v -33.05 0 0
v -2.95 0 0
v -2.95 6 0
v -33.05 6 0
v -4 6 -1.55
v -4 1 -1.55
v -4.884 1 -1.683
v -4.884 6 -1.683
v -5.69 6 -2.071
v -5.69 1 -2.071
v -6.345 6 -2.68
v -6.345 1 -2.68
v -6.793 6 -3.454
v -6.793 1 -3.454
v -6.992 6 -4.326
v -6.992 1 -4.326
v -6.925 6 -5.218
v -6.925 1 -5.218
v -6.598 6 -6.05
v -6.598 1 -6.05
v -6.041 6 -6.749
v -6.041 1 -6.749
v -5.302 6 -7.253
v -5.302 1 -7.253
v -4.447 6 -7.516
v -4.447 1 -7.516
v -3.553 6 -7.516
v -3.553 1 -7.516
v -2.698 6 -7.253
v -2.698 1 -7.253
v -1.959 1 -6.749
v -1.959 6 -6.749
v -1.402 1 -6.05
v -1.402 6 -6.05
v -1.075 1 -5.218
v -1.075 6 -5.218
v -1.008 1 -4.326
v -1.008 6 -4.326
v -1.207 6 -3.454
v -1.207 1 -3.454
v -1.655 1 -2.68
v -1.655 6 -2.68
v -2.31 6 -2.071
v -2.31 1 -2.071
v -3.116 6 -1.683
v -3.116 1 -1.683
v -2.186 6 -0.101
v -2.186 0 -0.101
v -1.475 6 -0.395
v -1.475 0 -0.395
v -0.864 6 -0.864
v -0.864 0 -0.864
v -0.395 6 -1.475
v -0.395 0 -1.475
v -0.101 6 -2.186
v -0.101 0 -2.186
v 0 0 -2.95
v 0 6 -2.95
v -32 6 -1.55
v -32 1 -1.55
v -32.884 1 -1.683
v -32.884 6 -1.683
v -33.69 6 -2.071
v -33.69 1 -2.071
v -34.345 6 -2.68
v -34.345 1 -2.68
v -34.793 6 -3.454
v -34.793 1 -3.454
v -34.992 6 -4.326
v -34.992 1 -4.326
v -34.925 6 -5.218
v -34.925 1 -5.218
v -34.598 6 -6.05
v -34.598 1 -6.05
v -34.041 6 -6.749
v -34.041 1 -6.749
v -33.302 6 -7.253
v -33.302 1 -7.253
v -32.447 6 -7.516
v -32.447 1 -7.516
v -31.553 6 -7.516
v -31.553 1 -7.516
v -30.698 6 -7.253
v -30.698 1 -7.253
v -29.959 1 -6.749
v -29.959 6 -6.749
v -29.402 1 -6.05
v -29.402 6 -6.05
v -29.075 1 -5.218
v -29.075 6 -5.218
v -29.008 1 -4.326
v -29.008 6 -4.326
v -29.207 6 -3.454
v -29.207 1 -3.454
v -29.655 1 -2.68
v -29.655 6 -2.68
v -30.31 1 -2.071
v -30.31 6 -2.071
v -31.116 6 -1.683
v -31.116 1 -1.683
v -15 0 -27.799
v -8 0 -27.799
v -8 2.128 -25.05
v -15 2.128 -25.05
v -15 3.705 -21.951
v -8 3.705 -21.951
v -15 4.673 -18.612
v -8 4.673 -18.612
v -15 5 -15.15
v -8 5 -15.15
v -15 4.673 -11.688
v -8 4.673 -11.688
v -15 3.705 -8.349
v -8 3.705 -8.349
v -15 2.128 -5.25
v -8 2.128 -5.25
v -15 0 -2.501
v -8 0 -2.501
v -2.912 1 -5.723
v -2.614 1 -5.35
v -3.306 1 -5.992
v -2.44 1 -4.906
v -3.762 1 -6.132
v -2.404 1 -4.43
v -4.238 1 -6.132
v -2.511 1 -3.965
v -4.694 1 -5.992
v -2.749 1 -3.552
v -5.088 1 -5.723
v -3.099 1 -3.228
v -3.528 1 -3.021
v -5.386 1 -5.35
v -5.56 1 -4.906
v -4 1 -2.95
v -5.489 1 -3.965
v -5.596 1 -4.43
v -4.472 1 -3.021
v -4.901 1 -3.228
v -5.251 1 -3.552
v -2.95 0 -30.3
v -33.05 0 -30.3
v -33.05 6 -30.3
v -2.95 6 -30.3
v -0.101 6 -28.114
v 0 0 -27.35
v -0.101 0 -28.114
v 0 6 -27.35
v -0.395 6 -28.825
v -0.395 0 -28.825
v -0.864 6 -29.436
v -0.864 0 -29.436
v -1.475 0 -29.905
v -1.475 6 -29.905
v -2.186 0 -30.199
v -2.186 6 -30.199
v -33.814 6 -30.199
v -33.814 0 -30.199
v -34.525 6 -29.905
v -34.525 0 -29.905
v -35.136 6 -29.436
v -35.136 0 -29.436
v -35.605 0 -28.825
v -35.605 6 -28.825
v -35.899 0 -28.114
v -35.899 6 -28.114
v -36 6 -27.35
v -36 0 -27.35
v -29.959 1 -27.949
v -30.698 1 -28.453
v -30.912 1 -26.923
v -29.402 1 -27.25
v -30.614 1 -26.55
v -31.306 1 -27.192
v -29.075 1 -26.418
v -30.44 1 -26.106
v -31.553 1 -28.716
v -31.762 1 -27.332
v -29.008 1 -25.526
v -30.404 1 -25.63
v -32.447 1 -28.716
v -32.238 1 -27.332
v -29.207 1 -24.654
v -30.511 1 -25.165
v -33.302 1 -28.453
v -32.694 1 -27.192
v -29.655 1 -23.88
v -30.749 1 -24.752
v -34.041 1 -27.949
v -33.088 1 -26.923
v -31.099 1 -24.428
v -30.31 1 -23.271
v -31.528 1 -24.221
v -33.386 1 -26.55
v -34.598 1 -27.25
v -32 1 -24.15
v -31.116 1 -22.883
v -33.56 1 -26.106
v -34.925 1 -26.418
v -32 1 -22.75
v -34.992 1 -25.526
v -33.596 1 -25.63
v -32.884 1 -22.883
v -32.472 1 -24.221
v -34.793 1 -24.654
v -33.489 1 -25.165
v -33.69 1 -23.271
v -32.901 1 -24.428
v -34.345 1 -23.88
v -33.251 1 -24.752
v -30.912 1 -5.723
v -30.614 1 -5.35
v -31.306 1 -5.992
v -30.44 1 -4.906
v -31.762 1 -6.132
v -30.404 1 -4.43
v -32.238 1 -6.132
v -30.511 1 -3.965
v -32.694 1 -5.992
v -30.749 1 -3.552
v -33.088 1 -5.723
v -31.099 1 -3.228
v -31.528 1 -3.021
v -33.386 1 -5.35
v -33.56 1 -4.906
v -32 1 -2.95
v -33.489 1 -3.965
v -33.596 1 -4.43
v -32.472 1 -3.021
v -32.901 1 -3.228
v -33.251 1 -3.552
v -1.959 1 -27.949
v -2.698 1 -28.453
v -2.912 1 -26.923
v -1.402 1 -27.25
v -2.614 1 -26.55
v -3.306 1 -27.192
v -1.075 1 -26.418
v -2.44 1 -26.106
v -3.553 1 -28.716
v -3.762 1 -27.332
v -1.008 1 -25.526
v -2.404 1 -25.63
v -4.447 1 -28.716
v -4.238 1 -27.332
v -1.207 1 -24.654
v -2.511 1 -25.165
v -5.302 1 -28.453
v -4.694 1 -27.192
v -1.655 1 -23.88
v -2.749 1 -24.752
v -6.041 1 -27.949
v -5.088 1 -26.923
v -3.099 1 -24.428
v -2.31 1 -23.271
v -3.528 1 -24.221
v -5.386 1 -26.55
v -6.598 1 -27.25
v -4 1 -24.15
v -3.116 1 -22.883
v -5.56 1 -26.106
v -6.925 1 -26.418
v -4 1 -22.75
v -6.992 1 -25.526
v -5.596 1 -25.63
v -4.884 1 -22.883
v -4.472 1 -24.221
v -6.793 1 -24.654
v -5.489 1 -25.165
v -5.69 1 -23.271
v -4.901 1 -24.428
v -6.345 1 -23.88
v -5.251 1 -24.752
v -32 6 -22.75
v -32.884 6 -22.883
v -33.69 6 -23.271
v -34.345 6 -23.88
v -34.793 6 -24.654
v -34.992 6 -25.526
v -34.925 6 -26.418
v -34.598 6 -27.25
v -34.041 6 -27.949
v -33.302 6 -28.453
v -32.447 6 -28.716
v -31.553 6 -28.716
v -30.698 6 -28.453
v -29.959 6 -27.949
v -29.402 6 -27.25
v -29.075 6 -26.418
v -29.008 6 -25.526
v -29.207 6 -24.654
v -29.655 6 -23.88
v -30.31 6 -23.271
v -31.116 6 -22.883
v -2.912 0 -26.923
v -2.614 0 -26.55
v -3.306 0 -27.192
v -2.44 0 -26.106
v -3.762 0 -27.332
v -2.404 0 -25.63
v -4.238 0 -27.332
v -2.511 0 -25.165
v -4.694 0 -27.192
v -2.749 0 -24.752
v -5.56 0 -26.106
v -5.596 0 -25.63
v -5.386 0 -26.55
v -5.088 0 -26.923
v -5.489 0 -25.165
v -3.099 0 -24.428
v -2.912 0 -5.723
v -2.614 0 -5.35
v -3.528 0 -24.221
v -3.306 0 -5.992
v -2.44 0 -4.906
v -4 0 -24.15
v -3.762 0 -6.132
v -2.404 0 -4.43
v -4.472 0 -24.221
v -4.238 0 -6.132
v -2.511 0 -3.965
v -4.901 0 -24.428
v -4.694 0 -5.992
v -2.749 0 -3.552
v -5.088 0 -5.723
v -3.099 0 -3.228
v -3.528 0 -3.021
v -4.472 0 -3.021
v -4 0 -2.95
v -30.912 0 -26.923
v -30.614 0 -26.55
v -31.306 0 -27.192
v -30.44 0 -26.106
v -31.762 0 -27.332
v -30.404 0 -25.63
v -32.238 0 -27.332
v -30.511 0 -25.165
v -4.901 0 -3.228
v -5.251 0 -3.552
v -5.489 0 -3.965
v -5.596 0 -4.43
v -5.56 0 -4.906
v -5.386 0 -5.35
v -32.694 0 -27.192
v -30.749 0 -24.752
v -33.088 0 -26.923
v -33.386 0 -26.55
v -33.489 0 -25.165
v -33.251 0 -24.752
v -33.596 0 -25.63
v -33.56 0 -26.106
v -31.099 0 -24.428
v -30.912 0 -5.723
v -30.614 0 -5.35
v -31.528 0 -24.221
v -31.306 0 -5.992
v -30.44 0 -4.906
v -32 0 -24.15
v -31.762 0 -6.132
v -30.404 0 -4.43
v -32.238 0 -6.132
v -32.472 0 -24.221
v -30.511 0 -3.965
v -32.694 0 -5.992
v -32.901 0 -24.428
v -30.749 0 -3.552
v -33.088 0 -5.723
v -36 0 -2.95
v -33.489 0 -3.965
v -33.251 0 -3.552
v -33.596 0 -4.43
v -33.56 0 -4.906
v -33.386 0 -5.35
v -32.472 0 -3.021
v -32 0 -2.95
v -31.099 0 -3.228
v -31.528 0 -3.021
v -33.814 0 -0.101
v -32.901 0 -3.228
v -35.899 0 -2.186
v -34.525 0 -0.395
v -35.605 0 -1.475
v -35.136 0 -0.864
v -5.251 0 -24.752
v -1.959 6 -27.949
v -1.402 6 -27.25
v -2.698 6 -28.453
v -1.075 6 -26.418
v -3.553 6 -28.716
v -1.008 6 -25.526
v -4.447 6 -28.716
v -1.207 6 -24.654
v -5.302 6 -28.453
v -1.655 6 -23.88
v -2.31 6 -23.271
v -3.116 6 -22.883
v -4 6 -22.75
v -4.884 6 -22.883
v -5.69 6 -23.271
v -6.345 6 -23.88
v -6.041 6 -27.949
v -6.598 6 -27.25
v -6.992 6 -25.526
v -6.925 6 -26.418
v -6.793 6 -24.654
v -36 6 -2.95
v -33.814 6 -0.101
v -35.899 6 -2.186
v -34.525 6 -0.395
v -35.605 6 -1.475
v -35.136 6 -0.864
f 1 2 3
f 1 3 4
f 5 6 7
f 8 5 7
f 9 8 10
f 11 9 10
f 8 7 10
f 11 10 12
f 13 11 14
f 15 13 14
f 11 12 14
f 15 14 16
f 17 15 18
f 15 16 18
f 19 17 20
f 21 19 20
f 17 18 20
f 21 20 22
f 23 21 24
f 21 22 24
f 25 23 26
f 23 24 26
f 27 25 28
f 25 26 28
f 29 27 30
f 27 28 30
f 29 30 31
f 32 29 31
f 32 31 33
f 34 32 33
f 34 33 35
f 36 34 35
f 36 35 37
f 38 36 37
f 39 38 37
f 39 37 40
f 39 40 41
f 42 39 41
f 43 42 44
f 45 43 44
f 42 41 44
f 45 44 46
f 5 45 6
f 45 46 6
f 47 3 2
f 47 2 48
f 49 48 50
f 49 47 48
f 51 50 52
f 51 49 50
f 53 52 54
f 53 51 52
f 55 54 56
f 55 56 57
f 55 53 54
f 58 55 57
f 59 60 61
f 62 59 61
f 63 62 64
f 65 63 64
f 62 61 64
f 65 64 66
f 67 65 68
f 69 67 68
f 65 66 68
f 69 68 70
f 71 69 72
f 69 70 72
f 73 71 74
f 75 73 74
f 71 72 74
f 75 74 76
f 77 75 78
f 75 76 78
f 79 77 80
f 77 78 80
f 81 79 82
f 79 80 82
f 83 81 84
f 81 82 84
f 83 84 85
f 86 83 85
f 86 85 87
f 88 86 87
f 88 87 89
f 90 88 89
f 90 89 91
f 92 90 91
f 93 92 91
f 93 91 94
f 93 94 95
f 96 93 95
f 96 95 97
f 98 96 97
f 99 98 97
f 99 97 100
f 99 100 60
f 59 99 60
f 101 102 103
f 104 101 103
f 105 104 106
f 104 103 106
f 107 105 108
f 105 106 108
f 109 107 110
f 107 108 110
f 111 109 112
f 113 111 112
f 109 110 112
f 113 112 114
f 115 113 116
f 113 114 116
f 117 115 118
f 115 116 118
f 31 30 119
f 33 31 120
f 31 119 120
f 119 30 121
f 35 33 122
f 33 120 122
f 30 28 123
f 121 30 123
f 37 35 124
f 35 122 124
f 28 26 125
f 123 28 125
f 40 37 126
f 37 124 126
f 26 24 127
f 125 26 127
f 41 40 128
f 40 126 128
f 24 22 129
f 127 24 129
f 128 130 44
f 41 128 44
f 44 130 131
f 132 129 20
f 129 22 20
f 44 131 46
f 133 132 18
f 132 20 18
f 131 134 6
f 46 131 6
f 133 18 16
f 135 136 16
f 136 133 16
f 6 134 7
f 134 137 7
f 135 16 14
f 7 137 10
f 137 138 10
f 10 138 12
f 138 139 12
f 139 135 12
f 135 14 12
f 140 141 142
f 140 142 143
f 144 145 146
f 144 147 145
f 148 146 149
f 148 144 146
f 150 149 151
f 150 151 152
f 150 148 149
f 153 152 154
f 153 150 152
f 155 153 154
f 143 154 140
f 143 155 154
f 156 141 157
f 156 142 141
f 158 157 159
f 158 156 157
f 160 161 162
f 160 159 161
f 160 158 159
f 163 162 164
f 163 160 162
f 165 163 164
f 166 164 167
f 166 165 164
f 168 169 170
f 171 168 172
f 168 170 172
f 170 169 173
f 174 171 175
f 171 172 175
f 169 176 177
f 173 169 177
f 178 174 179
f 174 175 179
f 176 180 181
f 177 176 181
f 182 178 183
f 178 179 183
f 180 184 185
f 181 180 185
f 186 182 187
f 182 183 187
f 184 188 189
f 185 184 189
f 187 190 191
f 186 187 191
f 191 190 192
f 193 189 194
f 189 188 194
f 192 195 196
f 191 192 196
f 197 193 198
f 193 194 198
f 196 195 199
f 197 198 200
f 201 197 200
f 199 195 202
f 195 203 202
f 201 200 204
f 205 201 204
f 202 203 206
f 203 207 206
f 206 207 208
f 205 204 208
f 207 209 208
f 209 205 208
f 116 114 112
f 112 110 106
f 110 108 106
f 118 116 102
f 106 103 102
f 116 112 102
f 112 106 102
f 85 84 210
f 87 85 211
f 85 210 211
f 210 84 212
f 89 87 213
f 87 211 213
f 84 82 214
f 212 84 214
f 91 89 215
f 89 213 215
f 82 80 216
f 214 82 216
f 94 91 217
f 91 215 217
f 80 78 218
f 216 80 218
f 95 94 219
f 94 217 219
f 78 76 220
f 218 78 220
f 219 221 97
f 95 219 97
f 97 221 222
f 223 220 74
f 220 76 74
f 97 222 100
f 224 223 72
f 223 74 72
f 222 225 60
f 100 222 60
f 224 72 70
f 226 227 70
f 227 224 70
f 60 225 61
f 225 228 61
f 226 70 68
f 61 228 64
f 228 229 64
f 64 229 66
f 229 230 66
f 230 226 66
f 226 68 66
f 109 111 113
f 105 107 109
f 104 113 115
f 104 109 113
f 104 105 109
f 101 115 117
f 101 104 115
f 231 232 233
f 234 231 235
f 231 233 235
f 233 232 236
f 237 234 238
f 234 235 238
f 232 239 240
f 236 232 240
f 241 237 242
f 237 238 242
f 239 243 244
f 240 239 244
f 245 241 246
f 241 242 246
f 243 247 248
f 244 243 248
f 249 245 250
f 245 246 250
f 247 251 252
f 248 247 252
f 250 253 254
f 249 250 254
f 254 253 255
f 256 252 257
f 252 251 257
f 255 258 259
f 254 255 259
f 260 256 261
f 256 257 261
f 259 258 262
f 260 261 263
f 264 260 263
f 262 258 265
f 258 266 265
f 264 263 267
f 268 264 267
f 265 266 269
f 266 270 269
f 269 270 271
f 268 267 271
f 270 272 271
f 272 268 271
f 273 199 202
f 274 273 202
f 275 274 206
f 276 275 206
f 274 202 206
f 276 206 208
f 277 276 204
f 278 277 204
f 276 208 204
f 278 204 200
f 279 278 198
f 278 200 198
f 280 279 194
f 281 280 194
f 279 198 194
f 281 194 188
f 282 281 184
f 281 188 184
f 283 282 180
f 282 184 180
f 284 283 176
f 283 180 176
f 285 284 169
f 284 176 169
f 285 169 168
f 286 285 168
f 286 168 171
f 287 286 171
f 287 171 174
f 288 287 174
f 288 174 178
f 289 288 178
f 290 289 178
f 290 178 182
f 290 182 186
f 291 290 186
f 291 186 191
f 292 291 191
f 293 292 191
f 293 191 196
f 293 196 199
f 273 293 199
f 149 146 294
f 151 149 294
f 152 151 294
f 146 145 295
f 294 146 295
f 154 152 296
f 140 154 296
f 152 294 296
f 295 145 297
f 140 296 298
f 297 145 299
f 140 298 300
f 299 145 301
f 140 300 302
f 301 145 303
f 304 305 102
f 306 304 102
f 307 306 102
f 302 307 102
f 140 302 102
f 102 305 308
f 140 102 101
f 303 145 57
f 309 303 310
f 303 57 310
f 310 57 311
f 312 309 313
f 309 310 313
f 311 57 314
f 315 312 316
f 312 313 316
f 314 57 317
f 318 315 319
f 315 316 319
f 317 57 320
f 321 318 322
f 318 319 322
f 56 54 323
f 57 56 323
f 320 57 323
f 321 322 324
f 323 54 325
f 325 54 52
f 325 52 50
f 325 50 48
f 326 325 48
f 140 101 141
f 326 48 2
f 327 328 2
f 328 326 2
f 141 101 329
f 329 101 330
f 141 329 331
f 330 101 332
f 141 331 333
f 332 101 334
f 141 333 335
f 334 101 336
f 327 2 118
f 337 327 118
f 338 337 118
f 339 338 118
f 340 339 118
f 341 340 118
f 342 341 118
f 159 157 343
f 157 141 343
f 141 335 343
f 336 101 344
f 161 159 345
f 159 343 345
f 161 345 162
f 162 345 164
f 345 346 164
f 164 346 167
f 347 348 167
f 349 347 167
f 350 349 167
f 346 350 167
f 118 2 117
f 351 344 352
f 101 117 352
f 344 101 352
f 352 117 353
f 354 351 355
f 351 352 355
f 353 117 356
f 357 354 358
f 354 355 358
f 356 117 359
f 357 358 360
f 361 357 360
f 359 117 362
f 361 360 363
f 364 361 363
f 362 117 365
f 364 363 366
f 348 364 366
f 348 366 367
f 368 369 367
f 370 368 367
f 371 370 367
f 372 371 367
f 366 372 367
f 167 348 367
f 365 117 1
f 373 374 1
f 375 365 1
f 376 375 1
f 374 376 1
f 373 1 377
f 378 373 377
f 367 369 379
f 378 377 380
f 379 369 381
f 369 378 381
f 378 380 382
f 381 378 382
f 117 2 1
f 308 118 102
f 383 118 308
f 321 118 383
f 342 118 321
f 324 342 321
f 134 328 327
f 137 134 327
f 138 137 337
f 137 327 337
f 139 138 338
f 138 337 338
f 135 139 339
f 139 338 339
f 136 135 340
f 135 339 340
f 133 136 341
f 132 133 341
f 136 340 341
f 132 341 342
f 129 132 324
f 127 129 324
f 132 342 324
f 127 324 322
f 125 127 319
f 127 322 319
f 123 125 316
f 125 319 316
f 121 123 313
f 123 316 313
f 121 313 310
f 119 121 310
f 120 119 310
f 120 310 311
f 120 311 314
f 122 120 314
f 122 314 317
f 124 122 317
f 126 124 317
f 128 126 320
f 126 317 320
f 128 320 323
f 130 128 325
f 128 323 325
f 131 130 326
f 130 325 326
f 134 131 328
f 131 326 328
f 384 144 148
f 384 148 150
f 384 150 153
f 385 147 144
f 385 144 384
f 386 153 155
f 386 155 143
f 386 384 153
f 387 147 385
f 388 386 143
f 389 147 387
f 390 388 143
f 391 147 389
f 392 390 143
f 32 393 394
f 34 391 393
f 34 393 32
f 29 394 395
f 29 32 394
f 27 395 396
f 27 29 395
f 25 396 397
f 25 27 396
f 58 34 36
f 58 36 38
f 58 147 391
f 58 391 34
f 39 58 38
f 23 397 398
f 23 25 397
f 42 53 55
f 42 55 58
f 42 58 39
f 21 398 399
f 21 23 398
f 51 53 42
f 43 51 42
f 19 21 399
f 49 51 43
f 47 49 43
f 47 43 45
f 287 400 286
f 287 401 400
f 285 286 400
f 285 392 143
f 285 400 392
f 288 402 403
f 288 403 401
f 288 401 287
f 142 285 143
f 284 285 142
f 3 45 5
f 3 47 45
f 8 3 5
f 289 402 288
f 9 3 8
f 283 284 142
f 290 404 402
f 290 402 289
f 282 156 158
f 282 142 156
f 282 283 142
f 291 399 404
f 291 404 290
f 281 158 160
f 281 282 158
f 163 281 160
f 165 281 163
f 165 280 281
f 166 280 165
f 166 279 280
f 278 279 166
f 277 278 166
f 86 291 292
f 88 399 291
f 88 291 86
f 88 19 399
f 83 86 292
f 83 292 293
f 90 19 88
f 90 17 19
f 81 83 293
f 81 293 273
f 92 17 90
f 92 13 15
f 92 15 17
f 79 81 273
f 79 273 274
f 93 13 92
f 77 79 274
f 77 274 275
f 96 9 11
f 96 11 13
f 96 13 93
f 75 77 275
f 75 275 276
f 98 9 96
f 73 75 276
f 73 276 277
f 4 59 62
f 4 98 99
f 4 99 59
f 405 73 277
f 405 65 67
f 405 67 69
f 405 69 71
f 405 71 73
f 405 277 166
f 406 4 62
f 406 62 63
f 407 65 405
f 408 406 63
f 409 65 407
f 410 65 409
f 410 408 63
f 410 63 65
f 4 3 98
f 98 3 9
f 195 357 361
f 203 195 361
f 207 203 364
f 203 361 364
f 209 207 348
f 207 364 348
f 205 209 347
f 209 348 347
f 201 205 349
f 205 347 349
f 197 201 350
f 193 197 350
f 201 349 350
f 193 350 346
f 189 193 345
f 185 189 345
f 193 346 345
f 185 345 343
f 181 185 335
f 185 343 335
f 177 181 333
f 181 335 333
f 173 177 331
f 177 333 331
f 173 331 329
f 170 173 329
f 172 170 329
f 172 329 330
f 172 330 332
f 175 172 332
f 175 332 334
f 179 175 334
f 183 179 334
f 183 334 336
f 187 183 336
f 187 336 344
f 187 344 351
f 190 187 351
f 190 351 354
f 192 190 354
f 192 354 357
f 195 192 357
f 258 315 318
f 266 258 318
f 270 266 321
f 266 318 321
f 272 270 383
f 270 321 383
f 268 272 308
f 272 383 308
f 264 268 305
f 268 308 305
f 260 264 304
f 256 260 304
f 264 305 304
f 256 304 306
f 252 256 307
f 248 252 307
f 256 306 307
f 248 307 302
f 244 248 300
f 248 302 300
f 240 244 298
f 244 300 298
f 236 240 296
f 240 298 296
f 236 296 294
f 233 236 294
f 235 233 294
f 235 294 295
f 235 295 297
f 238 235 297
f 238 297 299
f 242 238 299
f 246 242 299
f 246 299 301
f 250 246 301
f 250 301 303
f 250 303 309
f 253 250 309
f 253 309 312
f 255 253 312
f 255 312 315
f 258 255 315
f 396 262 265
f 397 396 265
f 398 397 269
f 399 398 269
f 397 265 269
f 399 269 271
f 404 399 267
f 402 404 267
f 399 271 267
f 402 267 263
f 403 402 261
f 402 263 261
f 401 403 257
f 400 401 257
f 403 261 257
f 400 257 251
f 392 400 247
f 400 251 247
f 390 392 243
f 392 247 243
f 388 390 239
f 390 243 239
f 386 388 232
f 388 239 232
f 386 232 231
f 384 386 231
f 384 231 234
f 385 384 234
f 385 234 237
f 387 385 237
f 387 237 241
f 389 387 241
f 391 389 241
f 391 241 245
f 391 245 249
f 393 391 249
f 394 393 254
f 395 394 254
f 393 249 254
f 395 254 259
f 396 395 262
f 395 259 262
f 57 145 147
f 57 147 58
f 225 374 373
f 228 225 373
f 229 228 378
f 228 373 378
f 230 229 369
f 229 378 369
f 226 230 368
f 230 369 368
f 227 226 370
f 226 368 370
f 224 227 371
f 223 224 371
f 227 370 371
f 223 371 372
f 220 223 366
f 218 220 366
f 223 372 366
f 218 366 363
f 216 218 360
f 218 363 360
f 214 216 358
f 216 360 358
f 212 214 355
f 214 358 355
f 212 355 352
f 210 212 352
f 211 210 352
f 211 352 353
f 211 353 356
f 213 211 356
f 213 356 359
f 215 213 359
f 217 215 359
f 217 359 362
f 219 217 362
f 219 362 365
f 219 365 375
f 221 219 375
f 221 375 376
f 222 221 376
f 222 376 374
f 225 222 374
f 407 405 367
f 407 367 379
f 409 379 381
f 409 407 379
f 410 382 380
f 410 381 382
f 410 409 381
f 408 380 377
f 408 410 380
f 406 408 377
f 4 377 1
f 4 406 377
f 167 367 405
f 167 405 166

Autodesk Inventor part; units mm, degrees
ref_plane "YZ Plane" through (0, 0, 0) normal (1, 0, 0) x (0, 1, 0)
ref_plane "XZ Plane" through (0, 0, 0) normal (0, 1, 0) x (-1, 0, 0)
sketch "Эскиз1" plane through (0, 0, 0) normal (0, 1, 0) x (-1, 0, 0)
  line L0 (0, 0) -> (36, 0)
  line L1 (36, 0) -> (36, -30.3)
  line L2 (36, -30.3) -> (0, -30.3)
  line L3 (0, -30.3) -> (0, 0)
  dimension "d0" = 36
  dimension "d1" = 30.3
extrude "Выдавливание1" add sketch "Эскиз1" along normal blind 6
sketch "Эскиз2" plane through (0, 6, 0) normal (0, 1, 0) x (1, 0, 0)
  line L0 (-36, 30.3) -> (-36, 0) projected
  line L1 (-36, 0) -> (0, 0) projected
  line L2 (-18, 0) -> (-18, 30.3)
  line L3 (0, 30.3) -> (-36, 30.3) projected
  line L4 (-36, 15.15) -> (0, 15.15)
  line L5 (0, 0) -> (0, 30.3) projected
  point P0 (-32, 4.55)
  point P1 (-32, 25.75)
  point P2 (-4, 4.55)
  point P3 (-4, 25.75)
  point P4 (-32, 4.55)
  dimension "d52" = 14
  dimension "d53" = 10.6
hole "Отверстие1" at (-32, 6, -4.55) at (-32, 6, -25.75) at (-4, 6, -25.75) at (-4, 6, -4.55) direction (0, -1, 0) diameter 3.2 end through all counterbore diameter 6 counterbore depth 5
sketch "Эскиз4" plane through (0, 0, -2.95) normal (1, 0, 0) x (0, 0, -1)
  line L0 (12.2, 0) -> (12.2, -13.5)
  circle A0 centre (12.2, -13.5) radius 18.5
  line L1 (-2.95, 3) -> (27.35, 3)
  line L2 (-2.95, 0) -> (-2.95, 6) projected
  line L3 (27.35, 0) -> (27.35, 6) projected
  line L4 (-2.95, 0) -> (27.35, 0) projected
  dimension "d27" = 13.5
  dimension "d38" = 37
ref_plane "РабПлоскость3" through (-8, 0, 0) normal (1, 0, 0) x (0, 0, -1)
ref_plane "РабПлоскость2" through (-18, 0, 0) normal (1, 0, 0) x (0, 0, -1)
extrude "Выдавливание3" cut sketch "Эскиз4" against normal blind 7 from surface at -8 contours A0 L4 | L4 A0 L1 | L1 A0
fillet "Сопряжение3" radius 2.95 4 edges at (-36, 3, 0) (-36, 3, -30.3) (0, 3, 0) (0, 3, -30.3)
equation "\"Радиус_гибки\" = Толщина"
equation "\"Ширина_просечки\" = Толщина"
equation "\"Глубина_просечки\" = 0.5 * Толщина"
equation "\"Размер_просечки\" = 4 * Толщина"
equation "\"Мин_остаток\" = 2 * Толщина"
equation "\"Радиус_перехода\" = Радиус_гибки"
equation "\"Радиус_Якоби\" = Толщина"
equation "\"Размер_зазора\" = Толщина"
equation "\"Толщина\" = 0.5"
properties part number "Крепление двигателя2"
